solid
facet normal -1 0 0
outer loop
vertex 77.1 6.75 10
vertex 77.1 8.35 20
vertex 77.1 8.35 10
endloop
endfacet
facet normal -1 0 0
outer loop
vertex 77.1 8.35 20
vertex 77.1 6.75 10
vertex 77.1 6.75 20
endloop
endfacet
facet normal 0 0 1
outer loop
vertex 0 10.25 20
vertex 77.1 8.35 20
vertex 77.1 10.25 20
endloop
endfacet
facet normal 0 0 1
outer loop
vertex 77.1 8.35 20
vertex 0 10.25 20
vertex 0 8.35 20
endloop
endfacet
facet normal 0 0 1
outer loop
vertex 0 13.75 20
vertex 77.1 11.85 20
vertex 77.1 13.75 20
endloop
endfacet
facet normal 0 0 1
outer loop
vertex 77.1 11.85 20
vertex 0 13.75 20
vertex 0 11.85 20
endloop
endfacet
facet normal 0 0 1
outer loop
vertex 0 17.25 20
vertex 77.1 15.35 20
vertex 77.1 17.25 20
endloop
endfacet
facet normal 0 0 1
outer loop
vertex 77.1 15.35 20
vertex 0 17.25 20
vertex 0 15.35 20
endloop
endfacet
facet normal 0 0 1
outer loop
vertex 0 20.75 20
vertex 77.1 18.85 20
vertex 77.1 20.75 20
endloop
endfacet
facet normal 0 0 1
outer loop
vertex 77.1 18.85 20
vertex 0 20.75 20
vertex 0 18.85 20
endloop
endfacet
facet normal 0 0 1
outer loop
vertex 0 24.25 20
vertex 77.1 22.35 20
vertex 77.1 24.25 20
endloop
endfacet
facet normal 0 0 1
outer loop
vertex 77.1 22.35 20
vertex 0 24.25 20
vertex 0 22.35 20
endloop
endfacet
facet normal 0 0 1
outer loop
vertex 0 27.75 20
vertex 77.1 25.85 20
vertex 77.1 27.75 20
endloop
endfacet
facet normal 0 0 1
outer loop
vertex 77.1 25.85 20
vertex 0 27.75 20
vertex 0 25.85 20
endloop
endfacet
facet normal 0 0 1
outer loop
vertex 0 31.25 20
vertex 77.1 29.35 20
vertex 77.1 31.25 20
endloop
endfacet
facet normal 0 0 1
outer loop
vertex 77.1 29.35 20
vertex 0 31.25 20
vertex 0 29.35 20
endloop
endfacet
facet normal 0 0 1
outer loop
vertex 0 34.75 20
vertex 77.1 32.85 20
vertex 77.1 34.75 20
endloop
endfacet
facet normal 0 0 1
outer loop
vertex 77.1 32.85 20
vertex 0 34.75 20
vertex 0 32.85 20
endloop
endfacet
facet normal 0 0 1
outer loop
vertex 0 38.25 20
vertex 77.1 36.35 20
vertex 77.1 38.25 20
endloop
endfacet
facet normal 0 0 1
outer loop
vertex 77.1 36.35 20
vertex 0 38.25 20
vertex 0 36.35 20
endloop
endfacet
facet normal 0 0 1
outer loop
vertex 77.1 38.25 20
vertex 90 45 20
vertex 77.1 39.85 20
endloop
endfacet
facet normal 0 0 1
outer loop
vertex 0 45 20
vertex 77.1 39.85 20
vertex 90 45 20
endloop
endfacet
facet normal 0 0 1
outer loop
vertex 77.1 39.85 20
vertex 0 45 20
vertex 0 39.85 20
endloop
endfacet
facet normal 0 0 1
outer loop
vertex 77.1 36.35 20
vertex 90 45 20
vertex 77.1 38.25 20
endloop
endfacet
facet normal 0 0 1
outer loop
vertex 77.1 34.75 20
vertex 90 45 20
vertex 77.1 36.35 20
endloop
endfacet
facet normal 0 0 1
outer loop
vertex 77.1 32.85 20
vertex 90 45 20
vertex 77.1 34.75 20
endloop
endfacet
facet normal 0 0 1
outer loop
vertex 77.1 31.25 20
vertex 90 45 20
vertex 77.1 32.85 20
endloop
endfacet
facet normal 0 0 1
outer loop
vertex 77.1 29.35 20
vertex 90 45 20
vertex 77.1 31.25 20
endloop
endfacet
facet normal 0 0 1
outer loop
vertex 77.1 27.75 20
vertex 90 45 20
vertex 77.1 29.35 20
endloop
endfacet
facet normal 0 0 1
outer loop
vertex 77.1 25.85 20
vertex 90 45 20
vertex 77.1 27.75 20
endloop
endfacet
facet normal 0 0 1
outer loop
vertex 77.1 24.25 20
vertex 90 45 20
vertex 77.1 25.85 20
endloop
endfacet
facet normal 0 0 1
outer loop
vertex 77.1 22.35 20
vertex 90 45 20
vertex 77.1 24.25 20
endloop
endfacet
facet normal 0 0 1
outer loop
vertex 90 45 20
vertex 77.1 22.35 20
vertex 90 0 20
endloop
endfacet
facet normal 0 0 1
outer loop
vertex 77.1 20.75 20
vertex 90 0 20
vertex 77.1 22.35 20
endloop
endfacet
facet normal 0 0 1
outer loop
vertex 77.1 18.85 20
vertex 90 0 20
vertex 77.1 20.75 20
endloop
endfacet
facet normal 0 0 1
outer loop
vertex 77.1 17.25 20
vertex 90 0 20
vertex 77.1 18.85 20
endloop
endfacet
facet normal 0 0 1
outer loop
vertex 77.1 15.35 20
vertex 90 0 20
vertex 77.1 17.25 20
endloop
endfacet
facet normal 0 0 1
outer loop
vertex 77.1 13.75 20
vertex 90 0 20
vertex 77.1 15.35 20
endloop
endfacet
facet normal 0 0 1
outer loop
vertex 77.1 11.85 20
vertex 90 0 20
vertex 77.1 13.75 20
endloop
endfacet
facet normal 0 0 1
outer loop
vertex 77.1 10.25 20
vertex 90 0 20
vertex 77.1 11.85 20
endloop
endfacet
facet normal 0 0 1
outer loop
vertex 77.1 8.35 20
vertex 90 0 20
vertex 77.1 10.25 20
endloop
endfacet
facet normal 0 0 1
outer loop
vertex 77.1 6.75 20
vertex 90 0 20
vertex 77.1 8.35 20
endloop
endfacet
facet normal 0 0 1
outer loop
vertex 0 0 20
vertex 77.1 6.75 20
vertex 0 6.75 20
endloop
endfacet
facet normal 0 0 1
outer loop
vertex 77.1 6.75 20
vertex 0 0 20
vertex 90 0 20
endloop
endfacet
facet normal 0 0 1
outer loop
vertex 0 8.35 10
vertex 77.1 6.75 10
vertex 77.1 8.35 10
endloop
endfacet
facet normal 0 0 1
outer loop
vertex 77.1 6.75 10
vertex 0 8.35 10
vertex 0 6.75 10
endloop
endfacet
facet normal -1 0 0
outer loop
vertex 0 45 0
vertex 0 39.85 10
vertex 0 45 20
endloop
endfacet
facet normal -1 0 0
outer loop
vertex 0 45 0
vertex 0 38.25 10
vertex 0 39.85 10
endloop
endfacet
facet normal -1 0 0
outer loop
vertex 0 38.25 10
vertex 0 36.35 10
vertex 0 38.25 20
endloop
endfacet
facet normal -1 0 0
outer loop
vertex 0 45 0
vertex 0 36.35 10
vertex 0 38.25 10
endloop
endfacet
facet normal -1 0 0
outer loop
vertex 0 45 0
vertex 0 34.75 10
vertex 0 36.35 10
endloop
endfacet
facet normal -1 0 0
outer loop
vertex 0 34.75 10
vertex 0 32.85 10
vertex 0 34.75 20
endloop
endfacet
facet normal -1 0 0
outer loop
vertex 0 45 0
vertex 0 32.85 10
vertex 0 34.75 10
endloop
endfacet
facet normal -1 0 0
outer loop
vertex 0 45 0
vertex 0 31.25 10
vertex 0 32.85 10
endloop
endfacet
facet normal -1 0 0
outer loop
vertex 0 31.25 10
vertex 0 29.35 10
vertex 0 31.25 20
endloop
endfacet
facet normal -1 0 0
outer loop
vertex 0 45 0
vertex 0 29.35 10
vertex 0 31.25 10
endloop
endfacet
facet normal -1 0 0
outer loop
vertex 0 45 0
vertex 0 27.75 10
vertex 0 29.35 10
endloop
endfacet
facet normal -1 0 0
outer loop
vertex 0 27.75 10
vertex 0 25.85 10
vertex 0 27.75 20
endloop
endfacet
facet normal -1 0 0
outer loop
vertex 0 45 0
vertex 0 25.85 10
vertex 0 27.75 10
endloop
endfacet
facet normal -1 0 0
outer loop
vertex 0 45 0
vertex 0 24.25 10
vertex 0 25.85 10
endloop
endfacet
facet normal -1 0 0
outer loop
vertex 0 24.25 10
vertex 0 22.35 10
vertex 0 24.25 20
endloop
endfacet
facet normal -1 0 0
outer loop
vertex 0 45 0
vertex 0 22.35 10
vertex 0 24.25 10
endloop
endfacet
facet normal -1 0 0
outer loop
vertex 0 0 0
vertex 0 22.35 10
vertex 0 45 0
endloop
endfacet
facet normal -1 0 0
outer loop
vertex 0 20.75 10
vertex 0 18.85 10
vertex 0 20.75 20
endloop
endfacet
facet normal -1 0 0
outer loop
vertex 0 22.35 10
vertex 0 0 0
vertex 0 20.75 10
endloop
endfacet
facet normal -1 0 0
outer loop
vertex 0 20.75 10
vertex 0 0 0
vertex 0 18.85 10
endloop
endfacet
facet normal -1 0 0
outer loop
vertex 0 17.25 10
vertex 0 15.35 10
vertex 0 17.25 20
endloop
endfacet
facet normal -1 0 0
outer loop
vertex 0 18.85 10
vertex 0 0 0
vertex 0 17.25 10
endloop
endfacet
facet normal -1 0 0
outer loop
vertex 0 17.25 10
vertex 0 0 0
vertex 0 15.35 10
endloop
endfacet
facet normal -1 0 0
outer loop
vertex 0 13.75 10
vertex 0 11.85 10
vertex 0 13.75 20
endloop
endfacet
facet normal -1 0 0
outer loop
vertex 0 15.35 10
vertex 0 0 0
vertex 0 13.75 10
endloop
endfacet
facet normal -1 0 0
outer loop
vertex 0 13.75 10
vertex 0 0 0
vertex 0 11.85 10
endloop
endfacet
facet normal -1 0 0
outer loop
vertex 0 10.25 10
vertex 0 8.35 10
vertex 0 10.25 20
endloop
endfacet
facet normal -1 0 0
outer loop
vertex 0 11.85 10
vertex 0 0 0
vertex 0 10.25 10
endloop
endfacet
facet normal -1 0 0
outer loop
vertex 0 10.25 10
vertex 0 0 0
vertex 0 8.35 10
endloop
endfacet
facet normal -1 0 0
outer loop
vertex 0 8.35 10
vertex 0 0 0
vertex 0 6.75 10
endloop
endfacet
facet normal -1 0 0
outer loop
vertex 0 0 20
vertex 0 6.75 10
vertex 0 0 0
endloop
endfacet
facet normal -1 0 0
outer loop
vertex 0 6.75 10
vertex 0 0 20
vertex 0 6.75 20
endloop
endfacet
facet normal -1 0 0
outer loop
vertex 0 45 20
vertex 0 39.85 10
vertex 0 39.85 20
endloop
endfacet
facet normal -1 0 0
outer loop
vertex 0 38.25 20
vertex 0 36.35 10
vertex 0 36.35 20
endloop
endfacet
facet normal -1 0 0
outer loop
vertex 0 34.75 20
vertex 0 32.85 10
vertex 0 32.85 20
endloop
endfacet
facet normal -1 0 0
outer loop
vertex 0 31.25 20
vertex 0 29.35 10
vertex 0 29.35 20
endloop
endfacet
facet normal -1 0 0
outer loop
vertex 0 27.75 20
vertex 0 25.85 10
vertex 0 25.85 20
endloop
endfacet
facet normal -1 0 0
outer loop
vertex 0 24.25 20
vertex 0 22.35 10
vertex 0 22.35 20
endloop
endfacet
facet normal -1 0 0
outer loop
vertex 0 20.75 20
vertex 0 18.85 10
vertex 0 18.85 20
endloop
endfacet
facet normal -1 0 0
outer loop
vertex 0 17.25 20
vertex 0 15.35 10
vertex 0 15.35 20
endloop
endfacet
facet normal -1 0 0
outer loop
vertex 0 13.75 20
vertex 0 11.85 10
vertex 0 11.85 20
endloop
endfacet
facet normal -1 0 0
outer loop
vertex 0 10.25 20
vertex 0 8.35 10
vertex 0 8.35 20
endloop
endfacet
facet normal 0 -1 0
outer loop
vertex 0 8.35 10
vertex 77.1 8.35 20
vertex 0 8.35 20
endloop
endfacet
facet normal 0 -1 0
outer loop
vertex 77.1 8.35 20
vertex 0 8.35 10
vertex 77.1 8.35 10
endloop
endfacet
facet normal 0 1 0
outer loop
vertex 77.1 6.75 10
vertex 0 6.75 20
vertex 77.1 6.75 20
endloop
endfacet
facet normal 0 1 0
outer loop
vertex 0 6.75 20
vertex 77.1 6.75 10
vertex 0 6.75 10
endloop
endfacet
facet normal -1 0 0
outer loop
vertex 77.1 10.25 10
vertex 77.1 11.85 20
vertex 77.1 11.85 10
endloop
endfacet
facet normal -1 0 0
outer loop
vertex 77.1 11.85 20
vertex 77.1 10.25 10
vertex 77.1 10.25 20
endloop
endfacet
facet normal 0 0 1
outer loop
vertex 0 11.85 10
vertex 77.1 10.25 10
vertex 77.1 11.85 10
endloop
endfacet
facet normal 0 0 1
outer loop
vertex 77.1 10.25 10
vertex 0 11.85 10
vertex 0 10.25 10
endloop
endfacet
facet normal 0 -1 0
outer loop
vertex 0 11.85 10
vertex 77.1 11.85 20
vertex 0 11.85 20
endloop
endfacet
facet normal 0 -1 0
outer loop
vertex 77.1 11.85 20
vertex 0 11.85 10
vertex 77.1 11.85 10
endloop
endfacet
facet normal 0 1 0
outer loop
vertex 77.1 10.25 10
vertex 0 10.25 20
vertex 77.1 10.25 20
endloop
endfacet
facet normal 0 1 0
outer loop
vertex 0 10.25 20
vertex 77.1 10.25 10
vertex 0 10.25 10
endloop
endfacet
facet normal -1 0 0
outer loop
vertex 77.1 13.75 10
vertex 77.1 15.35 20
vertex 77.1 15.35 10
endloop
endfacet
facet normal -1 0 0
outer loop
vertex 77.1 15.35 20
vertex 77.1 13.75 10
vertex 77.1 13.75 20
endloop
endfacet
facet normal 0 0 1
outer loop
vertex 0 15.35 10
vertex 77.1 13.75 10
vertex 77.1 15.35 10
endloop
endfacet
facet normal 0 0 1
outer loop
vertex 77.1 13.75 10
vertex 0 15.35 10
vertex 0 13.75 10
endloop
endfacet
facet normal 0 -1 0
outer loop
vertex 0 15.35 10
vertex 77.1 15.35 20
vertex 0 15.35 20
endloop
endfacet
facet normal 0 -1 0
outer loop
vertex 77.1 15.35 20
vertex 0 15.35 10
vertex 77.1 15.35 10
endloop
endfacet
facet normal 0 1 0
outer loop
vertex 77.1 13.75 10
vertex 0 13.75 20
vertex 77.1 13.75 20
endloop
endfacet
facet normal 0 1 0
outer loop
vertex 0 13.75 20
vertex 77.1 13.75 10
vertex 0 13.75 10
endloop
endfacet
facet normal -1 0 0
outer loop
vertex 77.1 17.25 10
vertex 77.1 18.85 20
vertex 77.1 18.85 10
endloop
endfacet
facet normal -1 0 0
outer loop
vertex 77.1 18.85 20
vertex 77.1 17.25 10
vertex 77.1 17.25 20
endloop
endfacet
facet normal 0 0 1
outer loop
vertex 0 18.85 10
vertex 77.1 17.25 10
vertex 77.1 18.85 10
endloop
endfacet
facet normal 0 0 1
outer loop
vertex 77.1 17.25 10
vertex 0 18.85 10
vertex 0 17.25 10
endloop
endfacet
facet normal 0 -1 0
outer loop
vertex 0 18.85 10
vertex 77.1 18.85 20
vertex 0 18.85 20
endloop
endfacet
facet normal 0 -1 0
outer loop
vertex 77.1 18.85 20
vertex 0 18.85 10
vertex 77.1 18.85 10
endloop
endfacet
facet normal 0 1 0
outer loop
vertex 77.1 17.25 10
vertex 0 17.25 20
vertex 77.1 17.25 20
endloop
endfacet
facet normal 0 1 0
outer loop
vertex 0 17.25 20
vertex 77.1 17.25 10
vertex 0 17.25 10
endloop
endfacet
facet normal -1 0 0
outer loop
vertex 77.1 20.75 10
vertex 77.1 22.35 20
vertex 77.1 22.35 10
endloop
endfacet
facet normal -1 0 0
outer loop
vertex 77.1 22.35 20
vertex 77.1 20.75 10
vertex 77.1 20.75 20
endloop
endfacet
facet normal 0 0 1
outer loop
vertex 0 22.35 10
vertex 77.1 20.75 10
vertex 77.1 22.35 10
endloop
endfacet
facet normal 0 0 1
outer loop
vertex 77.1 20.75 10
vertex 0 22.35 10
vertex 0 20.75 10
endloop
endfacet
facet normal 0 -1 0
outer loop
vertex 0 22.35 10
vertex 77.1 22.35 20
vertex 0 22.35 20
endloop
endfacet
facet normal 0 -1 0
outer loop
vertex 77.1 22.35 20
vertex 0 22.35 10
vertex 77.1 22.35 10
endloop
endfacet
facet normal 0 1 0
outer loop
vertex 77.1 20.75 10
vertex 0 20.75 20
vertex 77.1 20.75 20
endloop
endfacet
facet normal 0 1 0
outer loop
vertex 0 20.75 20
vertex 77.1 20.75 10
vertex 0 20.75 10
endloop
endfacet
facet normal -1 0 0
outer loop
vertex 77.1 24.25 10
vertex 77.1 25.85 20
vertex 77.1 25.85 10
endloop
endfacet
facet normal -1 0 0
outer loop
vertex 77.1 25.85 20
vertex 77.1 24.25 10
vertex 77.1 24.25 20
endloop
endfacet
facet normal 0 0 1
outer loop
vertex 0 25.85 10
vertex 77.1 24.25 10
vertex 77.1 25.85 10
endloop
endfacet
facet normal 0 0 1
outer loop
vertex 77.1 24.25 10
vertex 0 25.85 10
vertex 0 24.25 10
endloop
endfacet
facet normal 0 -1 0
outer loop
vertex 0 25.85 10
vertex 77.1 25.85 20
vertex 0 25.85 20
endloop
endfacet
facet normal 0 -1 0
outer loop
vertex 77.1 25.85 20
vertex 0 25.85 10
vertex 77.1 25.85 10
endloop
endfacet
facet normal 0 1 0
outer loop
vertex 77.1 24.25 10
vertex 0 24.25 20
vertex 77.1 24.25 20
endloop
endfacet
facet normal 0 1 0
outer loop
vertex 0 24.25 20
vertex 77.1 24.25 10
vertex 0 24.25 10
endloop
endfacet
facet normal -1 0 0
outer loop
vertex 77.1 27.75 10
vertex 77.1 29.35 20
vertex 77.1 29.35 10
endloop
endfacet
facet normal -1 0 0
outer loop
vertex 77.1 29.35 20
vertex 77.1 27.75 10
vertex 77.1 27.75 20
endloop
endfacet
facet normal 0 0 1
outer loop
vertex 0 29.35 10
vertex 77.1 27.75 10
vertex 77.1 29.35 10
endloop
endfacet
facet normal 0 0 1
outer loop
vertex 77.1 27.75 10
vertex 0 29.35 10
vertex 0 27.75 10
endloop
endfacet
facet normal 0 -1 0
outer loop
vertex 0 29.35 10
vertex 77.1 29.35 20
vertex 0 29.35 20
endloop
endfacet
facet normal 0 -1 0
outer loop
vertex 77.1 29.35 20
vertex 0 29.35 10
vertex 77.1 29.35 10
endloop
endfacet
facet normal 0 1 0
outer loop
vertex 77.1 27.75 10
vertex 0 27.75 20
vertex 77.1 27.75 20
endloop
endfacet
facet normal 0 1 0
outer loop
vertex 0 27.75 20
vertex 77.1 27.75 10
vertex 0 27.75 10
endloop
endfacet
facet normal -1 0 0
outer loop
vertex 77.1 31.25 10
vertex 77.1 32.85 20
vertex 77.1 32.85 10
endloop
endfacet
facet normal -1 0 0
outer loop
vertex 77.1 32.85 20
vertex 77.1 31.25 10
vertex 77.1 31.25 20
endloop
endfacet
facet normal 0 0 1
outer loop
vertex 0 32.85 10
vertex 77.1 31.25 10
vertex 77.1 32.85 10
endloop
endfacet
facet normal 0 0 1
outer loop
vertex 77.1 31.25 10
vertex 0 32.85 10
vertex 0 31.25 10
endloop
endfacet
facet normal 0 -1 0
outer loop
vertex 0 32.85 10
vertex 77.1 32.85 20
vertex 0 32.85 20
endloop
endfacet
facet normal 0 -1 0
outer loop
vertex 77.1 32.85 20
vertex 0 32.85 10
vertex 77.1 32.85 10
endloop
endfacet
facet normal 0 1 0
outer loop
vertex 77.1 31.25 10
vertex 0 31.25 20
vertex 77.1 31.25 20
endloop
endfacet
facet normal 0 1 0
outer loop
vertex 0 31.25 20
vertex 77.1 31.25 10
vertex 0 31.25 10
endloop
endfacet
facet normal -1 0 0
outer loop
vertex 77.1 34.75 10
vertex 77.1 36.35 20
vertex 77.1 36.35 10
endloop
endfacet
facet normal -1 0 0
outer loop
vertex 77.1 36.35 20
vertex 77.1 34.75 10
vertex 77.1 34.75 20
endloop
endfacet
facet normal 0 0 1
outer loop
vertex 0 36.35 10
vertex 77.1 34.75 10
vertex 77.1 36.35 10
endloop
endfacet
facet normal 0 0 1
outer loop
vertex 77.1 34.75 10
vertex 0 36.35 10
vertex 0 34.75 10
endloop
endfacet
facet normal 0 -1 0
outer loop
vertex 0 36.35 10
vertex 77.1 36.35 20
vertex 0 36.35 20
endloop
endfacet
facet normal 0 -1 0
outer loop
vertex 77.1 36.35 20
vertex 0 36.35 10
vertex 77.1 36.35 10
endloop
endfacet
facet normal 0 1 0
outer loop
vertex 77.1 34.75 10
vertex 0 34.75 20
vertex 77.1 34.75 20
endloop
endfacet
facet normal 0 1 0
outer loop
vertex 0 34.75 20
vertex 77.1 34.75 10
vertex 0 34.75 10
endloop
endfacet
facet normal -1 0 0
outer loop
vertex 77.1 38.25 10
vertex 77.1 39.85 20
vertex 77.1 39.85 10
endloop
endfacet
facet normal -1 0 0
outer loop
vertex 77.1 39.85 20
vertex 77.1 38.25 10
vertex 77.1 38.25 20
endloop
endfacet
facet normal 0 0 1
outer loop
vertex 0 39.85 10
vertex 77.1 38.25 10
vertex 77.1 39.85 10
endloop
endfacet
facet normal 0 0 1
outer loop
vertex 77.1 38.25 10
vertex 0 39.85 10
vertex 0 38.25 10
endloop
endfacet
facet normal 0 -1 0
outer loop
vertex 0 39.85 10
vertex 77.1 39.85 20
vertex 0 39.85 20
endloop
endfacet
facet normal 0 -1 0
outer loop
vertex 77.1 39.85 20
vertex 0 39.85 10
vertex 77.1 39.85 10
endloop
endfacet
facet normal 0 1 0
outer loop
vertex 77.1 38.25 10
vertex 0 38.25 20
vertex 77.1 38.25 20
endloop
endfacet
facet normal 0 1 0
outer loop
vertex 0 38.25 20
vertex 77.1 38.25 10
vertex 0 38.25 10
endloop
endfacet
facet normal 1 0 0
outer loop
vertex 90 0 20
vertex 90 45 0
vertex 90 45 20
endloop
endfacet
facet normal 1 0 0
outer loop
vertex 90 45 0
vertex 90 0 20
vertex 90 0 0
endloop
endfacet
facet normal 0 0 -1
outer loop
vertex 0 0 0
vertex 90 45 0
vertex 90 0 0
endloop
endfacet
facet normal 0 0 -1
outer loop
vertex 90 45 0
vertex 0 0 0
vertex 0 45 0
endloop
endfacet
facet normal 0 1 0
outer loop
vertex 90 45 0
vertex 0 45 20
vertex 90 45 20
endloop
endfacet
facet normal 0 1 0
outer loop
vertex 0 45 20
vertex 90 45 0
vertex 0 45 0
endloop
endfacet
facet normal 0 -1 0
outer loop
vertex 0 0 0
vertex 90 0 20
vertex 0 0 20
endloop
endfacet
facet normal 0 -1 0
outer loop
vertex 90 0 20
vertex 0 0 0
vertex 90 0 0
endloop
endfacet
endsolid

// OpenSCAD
// Drying Rack for 10 Microscope Slides
// Base: 90 x 45 x 20 mm (Resting on Z=0)
// Slots: 10 parallel slots along X, 77mm long, 1.6mm wide, 10mm deep
// Spacing: 3.5mm centre-to-centre in Y

$fn = 128;

// Base Dimensions
base_length = 90;
base_width = 45;
base_height = 20;

// Slide Dimensions (for reference)
slide_length = 75;
slide_width = 25;
slide_thickness = 1;

// Slot Dimensions
num_slots = 10;
slot_length = 77;
slot_width = 1.6;
slot_depth = 10;
slot_spacing = 3.5; // Centre-to-centre in Y

// Calculate Y position of the first slot centre
// The group of slots is centred on the block in Y.
total_span = (num_slots - 1) * slot_spacing;
y_offset = (base_width - total_span) / 2;

// Build the solid base block starting at Z=0
difference() {
    // Main block: 90 x 45 x 20, resting on Z=0
    cube([base_length, base_width, base_height], center = false);
    
    // Cut the 10 slots
    // Slots run along X.
    // We cut from the top surface (Z=20) downwards to Z=10.
    // The cut shape must extend slightly past the slot length in X to ensure clean cut.
    cut_extension = 0.1; 
    
    for (i = [0 : num_slots - 1]) {
        // Calculate Y position for this specific slot
        y_pos = y_offset + i * slot_spacing;
        
        // Define the slot geometry
        // The slot is a rectangular prism cut into the top face.
        // It runs along X, has width in Y, and depth in Z.
        
        translate([0, y_pos, base_height - slot_depth]) {
            // Cut shape: 
            // X: slot_length + extension
            // Y: slot_width
            // Z: slot_depth (extends from current Z up to base_height)
            cube([slot_length + cut_extension, slot_width, slot_depth], center = false);
        }
    }
}
